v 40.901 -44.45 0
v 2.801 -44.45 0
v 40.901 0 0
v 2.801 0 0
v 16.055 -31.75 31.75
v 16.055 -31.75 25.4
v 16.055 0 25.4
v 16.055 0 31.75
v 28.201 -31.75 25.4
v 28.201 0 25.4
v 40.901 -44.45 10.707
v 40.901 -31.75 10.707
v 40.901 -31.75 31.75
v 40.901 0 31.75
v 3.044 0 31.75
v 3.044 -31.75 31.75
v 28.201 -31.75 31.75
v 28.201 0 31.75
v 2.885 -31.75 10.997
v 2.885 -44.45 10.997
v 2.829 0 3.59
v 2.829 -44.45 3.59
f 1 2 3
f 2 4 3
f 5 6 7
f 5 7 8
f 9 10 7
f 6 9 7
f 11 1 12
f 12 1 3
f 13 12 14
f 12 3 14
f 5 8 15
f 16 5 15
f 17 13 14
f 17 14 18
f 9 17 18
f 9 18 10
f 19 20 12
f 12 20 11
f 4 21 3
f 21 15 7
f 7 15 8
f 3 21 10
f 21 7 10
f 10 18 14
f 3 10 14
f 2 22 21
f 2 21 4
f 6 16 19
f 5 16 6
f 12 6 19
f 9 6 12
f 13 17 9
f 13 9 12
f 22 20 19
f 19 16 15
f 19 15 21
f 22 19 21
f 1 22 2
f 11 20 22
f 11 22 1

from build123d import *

# Parameters (mm, degrees)
F1_DEPTH = 19.05
F2_DEPTH = 25.4
F3_DEPTH = 25.4
F5_DEPTH = 12.7


with BuildPart() as f1:
    # F0 (on Front) → F1 (new body)
    with BuildSketch(Plane.XZ):
        Polygon((2.828845887, 3.5896749168), (2.8014711667, 0), (40.9014711667, 0), (40.9014711667, 3.2993345685), align=None)
        Polygon((2.9930308781, 25.1194198566), (2.828845887, 3.5896749168), (40.9014711667, 3.2993345685), (40.9014711667, 25.3031502977), (28.2014711667, 25.4), (16.0545626627, 25.4), align=None)
        Polygon((3.0435954224, 31.75), (2.9930308781, 25.1194198566), (16.0545626627, 25.4), (16.0545626627, 31.75), align=None)
        Polygon((28.2014711667, 25.4), (40.9014711667, 25.3031502977), (40.9014711667, 31.75), (28.2014711667, 31.75), align=None)
    extrude(amount=F1_DEPTH)

    # F0 (on Front) → F2 (cut)
    with BuildSketch(Plane.XZ):
        Polygon((2.828845887, 3.5896749168), (2.8014711667, 0), (40.9014711667, 0), (40.9014711667, 3.2993345685), align=None)
        Polygon((2.9930308781, 25.1194198566), (2.828845887, 3.5896749168), (40.9014711667, 3.2993345685), (40.9014711667, 25.3031502977), (28.2014711667, 25.4), (16.0545626627, 25.4), align=None)
        Polygon((3.0435954224, 31.75), (2.9930308781, 25.1194198566), (16.0545626627, 25.4), (16.0545626627, 31.75), align=None)
        Polygon((28.2014711667, 25.4), (40.9014711667, 25.3031502977), (40.9014711667, 31.75), (28.2014711667, 31.75), align=None)
    extrude(amount=-F2_DEPTH, mode=Mode.SUBTRACT)

    # F3 (add): a face of the model
    f3_faces = [f1.faces().sort_by_distance(p)[0] for p in [
        (21.8971715309, -19.05, 14.989088292),
    ]]
    extrude(f3_faces, amount=F3_DEPTH)

    # F4 (on face) → F5 (cut)
    with BuildSketch(Plane.XZ.offset(44.45)):
        Polygon((3.0435954224, 31.75), (2.8853301618, 10.9965153512), (40.9014711667, 10.7066057497), (40.9014711667, 31.75), (28.2014711667, 31.75), (28.2014711667, 25.4), (16.0545626627, 25.4), (16.0545626627, 31.75), align=None)
    extrude(amount=-F5_DEPTH, mode=Mode.SUBTRACT)


solid = f1.part
